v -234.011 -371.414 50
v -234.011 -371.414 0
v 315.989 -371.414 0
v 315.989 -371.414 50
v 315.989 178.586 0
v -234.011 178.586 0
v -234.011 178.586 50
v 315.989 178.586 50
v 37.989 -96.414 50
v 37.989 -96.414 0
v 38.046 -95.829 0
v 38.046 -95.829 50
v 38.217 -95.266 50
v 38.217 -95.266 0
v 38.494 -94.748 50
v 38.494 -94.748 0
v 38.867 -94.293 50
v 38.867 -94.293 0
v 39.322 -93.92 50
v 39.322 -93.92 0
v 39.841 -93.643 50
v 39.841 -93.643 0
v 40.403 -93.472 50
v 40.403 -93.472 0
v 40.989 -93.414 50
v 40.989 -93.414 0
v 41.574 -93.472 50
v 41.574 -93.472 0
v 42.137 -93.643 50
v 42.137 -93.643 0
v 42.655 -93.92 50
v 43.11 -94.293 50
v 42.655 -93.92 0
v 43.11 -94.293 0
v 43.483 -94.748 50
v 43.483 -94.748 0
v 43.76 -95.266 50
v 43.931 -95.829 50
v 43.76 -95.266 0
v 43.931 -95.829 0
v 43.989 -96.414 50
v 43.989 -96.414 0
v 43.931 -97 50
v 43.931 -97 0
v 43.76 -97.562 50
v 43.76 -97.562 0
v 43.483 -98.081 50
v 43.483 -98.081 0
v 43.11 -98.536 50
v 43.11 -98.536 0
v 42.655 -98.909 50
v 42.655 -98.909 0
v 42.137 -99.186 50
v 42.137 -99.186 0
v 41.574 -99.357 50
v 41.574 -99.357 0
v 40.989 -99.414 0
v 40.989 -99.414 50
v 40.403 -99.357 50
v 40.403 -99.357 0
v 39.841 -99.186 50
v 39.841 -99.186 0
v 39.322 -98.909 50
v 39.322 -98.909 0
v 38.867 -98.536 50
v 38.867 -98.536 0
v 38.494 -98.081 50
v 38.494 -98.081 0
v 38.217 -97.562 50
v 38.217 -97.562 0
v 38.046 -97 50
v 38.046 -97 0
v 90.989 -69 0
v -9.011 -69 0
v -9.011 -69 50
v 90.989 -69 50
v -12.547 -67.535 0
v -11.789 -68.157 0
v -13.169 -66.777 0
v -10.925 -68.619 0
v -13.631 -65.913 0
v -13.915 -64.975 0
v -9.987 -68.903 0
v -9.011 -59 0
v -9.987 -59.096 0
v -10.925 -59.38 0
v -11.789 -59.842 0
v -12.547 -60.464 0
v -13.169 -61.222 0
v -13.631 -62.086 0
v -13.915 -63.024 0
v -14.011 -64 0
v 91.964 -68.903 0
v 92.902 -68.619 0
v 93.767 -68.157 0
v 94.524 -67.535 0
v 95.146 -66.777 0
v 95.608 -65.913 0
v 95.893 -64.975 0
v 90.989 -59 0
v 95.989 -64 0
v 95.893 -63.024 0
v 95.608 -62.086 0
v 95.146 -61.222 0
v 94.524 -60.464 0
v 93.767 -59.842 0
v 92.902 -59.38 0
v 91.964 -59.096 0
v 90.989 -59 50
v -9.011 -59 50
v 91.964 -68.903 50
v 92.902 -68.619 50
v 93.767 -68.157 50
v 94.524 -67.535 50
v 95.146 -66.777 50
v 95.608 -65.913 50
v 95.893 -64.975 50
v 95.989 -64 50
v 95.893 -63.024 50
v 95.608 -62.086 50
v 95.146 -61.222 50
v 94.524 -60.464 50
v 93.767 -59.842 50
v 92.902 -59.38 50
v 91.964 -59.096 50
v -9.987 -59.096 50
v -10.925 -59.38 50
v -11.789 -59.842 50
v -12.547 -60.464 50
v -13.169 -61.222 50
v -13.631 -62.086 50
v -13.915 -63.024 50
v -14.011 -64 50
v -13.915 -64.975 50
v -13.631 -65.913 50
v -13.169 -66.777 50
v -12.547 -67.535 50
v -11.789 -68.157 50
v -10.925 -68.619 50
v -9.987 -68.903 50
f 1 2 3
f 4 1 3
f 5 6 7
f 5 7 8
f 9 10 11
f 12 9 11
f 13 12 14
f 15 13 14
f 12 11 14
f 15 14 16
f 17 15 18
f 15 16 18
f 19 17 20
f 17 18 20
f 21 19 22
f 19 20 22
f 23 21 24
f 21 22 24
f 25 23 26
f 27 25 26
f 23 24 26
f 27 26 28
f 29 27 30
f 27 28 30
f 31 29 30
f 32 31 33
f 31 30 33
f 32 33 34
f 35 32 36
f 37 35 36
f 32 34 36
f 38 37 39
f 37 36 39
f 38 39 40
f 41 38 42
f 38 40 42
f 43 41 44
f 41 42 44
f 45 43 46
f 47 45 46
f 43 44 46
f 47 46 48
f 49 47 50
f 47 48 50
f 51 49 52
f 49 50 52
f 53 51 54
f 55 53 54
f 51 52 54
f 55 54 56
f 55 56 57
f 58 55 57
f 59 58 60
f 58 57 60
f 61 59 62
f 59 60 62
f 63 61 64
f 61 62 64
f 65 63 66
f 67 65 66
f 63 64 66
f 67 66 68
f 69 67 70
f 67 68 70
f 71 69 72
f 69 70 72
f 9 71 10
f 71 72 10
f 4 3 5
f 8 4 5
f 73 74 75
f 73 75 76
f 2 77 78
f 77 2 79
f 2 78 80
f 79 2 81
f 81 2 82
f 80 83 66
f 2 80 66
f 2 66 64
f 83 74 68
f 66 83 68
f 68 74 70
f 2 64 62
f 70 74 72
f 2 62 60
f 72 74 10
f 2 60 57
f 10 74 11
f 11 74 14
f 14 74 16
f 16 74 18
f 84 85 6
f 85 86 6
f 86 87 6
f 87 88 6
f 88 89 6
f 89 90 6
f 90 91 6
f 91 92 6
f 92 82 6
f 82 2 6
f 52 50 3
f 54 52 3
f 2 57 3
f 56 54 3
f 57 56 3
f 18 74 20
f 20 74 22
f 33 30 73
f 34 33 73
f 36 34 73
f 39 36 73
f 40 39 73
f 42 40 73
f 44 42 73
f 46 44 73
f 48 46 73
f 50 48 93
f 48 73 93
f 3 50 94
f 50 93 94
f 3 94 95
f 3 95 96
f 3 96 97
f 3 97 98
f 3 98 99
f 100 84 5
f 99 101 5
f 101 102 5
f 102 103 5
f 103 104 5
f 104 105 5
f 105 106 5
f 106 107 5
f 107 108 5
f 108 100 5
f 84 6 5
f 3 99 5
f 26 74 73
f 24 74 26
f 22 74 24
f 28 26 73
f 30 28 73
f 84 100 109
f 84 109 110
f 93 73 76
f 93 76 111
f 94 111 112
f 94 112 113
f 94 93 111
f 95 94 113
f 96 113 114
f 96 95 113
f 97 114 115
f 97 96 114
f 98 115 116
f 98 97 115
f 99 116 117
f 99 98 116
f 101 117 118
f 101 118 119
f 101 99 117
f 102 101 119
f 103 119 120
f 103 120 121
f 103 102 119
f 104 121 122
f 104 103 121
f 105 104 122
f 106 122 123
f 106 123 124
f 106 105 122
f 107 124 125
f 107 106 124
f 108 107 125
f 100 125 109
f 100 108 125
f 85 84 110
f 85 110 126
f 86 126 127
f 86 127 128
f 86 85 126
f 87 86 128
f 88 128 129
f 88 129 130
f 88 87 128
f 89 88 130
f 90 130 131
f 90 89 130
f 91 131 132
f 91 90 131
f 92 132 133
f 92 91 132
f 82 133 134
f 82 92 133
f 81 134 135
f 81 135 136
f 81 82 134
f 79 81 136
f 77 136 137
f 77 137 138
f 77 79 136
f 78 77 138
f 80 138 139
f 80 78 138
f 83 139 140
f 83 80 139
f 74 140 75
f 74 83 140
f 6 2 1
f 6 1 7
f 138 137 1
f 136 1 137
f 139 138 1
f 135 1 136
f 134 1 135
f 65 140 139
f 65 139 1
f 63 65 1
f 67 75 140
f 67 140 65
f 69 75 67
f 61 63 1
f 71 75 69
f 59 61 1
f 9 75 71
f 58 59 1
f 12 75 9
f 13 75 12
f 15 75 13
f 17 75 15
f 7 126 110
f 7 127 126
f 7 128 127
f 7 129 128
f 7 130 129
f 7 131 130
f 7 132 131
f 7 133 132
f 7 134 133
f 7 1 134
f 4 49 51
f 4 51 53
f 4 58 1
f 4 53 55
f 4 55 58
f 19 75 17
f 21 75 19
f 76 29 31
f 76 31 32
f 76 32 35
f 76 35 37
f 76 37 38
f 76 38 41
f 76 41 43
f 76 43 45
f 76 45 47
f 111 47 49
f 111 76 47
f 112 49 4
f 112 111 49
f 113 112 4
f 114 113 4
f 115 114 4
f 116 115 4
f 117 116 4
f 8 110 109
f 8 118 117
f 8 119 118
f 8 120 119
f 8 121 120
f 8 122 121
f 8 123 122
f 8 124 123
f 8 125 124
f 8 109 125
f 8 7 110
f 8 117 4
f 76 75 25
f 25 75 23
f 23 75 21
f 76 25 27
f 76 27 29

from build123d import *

# Parameters (mm, degrees)
CROQUIS1_W              = 550
CROQUIS1_H              = 550
SALIENTE_EXTRUIR1_DEPTH = 50
CROQUIS2_R              = 3
CORTAR_EXTRUIR1_DEPTH   = 50


with BuildPart() as part:
    # Croquis1 → Saliente-Extruir1 (new body)
    with BuildSketch(Plane.XY):
        with Locations((40.988720017, -96.414342629)):
            Rectangle(CROQUIS1_W, CROQUIS1_H)
    extrude(amount=SALIENTE_EXTRUIR1_DEPTH)

    # Croquis2 → Cortar-Extruir1 (cut)
    with BuildSketch(Plane(origin=(0, 0, 0), x_dir=(-1, 0, 0), z_dir=(0, 0, -1))):
        with Locations((-40.988720017, -96.414342629)):
            Circle(CROQUIS2_R)
        with BuildLine():
            Line((-90.988720017, -58.999514309), (9.011279983, -58.999514309))
            ThreePointArc((9.011279983, -58.999514309), (14.011279983, -63.999514309), (9.011279983, -68.999514309))
            Line((9.011279983, -68.999514309), (-90.988720017, -68.999514309))
            ThreePointArc((-90.988720017, -68.999514309), (-95.988720017, -63.999514309), (-90.988720017, -58.999514309))
        make_face()
    extrude(amount=-CORTAR_EXTRUIR1_DEPTH, mode=Mode.SUBTRACT)


solid = part.part
